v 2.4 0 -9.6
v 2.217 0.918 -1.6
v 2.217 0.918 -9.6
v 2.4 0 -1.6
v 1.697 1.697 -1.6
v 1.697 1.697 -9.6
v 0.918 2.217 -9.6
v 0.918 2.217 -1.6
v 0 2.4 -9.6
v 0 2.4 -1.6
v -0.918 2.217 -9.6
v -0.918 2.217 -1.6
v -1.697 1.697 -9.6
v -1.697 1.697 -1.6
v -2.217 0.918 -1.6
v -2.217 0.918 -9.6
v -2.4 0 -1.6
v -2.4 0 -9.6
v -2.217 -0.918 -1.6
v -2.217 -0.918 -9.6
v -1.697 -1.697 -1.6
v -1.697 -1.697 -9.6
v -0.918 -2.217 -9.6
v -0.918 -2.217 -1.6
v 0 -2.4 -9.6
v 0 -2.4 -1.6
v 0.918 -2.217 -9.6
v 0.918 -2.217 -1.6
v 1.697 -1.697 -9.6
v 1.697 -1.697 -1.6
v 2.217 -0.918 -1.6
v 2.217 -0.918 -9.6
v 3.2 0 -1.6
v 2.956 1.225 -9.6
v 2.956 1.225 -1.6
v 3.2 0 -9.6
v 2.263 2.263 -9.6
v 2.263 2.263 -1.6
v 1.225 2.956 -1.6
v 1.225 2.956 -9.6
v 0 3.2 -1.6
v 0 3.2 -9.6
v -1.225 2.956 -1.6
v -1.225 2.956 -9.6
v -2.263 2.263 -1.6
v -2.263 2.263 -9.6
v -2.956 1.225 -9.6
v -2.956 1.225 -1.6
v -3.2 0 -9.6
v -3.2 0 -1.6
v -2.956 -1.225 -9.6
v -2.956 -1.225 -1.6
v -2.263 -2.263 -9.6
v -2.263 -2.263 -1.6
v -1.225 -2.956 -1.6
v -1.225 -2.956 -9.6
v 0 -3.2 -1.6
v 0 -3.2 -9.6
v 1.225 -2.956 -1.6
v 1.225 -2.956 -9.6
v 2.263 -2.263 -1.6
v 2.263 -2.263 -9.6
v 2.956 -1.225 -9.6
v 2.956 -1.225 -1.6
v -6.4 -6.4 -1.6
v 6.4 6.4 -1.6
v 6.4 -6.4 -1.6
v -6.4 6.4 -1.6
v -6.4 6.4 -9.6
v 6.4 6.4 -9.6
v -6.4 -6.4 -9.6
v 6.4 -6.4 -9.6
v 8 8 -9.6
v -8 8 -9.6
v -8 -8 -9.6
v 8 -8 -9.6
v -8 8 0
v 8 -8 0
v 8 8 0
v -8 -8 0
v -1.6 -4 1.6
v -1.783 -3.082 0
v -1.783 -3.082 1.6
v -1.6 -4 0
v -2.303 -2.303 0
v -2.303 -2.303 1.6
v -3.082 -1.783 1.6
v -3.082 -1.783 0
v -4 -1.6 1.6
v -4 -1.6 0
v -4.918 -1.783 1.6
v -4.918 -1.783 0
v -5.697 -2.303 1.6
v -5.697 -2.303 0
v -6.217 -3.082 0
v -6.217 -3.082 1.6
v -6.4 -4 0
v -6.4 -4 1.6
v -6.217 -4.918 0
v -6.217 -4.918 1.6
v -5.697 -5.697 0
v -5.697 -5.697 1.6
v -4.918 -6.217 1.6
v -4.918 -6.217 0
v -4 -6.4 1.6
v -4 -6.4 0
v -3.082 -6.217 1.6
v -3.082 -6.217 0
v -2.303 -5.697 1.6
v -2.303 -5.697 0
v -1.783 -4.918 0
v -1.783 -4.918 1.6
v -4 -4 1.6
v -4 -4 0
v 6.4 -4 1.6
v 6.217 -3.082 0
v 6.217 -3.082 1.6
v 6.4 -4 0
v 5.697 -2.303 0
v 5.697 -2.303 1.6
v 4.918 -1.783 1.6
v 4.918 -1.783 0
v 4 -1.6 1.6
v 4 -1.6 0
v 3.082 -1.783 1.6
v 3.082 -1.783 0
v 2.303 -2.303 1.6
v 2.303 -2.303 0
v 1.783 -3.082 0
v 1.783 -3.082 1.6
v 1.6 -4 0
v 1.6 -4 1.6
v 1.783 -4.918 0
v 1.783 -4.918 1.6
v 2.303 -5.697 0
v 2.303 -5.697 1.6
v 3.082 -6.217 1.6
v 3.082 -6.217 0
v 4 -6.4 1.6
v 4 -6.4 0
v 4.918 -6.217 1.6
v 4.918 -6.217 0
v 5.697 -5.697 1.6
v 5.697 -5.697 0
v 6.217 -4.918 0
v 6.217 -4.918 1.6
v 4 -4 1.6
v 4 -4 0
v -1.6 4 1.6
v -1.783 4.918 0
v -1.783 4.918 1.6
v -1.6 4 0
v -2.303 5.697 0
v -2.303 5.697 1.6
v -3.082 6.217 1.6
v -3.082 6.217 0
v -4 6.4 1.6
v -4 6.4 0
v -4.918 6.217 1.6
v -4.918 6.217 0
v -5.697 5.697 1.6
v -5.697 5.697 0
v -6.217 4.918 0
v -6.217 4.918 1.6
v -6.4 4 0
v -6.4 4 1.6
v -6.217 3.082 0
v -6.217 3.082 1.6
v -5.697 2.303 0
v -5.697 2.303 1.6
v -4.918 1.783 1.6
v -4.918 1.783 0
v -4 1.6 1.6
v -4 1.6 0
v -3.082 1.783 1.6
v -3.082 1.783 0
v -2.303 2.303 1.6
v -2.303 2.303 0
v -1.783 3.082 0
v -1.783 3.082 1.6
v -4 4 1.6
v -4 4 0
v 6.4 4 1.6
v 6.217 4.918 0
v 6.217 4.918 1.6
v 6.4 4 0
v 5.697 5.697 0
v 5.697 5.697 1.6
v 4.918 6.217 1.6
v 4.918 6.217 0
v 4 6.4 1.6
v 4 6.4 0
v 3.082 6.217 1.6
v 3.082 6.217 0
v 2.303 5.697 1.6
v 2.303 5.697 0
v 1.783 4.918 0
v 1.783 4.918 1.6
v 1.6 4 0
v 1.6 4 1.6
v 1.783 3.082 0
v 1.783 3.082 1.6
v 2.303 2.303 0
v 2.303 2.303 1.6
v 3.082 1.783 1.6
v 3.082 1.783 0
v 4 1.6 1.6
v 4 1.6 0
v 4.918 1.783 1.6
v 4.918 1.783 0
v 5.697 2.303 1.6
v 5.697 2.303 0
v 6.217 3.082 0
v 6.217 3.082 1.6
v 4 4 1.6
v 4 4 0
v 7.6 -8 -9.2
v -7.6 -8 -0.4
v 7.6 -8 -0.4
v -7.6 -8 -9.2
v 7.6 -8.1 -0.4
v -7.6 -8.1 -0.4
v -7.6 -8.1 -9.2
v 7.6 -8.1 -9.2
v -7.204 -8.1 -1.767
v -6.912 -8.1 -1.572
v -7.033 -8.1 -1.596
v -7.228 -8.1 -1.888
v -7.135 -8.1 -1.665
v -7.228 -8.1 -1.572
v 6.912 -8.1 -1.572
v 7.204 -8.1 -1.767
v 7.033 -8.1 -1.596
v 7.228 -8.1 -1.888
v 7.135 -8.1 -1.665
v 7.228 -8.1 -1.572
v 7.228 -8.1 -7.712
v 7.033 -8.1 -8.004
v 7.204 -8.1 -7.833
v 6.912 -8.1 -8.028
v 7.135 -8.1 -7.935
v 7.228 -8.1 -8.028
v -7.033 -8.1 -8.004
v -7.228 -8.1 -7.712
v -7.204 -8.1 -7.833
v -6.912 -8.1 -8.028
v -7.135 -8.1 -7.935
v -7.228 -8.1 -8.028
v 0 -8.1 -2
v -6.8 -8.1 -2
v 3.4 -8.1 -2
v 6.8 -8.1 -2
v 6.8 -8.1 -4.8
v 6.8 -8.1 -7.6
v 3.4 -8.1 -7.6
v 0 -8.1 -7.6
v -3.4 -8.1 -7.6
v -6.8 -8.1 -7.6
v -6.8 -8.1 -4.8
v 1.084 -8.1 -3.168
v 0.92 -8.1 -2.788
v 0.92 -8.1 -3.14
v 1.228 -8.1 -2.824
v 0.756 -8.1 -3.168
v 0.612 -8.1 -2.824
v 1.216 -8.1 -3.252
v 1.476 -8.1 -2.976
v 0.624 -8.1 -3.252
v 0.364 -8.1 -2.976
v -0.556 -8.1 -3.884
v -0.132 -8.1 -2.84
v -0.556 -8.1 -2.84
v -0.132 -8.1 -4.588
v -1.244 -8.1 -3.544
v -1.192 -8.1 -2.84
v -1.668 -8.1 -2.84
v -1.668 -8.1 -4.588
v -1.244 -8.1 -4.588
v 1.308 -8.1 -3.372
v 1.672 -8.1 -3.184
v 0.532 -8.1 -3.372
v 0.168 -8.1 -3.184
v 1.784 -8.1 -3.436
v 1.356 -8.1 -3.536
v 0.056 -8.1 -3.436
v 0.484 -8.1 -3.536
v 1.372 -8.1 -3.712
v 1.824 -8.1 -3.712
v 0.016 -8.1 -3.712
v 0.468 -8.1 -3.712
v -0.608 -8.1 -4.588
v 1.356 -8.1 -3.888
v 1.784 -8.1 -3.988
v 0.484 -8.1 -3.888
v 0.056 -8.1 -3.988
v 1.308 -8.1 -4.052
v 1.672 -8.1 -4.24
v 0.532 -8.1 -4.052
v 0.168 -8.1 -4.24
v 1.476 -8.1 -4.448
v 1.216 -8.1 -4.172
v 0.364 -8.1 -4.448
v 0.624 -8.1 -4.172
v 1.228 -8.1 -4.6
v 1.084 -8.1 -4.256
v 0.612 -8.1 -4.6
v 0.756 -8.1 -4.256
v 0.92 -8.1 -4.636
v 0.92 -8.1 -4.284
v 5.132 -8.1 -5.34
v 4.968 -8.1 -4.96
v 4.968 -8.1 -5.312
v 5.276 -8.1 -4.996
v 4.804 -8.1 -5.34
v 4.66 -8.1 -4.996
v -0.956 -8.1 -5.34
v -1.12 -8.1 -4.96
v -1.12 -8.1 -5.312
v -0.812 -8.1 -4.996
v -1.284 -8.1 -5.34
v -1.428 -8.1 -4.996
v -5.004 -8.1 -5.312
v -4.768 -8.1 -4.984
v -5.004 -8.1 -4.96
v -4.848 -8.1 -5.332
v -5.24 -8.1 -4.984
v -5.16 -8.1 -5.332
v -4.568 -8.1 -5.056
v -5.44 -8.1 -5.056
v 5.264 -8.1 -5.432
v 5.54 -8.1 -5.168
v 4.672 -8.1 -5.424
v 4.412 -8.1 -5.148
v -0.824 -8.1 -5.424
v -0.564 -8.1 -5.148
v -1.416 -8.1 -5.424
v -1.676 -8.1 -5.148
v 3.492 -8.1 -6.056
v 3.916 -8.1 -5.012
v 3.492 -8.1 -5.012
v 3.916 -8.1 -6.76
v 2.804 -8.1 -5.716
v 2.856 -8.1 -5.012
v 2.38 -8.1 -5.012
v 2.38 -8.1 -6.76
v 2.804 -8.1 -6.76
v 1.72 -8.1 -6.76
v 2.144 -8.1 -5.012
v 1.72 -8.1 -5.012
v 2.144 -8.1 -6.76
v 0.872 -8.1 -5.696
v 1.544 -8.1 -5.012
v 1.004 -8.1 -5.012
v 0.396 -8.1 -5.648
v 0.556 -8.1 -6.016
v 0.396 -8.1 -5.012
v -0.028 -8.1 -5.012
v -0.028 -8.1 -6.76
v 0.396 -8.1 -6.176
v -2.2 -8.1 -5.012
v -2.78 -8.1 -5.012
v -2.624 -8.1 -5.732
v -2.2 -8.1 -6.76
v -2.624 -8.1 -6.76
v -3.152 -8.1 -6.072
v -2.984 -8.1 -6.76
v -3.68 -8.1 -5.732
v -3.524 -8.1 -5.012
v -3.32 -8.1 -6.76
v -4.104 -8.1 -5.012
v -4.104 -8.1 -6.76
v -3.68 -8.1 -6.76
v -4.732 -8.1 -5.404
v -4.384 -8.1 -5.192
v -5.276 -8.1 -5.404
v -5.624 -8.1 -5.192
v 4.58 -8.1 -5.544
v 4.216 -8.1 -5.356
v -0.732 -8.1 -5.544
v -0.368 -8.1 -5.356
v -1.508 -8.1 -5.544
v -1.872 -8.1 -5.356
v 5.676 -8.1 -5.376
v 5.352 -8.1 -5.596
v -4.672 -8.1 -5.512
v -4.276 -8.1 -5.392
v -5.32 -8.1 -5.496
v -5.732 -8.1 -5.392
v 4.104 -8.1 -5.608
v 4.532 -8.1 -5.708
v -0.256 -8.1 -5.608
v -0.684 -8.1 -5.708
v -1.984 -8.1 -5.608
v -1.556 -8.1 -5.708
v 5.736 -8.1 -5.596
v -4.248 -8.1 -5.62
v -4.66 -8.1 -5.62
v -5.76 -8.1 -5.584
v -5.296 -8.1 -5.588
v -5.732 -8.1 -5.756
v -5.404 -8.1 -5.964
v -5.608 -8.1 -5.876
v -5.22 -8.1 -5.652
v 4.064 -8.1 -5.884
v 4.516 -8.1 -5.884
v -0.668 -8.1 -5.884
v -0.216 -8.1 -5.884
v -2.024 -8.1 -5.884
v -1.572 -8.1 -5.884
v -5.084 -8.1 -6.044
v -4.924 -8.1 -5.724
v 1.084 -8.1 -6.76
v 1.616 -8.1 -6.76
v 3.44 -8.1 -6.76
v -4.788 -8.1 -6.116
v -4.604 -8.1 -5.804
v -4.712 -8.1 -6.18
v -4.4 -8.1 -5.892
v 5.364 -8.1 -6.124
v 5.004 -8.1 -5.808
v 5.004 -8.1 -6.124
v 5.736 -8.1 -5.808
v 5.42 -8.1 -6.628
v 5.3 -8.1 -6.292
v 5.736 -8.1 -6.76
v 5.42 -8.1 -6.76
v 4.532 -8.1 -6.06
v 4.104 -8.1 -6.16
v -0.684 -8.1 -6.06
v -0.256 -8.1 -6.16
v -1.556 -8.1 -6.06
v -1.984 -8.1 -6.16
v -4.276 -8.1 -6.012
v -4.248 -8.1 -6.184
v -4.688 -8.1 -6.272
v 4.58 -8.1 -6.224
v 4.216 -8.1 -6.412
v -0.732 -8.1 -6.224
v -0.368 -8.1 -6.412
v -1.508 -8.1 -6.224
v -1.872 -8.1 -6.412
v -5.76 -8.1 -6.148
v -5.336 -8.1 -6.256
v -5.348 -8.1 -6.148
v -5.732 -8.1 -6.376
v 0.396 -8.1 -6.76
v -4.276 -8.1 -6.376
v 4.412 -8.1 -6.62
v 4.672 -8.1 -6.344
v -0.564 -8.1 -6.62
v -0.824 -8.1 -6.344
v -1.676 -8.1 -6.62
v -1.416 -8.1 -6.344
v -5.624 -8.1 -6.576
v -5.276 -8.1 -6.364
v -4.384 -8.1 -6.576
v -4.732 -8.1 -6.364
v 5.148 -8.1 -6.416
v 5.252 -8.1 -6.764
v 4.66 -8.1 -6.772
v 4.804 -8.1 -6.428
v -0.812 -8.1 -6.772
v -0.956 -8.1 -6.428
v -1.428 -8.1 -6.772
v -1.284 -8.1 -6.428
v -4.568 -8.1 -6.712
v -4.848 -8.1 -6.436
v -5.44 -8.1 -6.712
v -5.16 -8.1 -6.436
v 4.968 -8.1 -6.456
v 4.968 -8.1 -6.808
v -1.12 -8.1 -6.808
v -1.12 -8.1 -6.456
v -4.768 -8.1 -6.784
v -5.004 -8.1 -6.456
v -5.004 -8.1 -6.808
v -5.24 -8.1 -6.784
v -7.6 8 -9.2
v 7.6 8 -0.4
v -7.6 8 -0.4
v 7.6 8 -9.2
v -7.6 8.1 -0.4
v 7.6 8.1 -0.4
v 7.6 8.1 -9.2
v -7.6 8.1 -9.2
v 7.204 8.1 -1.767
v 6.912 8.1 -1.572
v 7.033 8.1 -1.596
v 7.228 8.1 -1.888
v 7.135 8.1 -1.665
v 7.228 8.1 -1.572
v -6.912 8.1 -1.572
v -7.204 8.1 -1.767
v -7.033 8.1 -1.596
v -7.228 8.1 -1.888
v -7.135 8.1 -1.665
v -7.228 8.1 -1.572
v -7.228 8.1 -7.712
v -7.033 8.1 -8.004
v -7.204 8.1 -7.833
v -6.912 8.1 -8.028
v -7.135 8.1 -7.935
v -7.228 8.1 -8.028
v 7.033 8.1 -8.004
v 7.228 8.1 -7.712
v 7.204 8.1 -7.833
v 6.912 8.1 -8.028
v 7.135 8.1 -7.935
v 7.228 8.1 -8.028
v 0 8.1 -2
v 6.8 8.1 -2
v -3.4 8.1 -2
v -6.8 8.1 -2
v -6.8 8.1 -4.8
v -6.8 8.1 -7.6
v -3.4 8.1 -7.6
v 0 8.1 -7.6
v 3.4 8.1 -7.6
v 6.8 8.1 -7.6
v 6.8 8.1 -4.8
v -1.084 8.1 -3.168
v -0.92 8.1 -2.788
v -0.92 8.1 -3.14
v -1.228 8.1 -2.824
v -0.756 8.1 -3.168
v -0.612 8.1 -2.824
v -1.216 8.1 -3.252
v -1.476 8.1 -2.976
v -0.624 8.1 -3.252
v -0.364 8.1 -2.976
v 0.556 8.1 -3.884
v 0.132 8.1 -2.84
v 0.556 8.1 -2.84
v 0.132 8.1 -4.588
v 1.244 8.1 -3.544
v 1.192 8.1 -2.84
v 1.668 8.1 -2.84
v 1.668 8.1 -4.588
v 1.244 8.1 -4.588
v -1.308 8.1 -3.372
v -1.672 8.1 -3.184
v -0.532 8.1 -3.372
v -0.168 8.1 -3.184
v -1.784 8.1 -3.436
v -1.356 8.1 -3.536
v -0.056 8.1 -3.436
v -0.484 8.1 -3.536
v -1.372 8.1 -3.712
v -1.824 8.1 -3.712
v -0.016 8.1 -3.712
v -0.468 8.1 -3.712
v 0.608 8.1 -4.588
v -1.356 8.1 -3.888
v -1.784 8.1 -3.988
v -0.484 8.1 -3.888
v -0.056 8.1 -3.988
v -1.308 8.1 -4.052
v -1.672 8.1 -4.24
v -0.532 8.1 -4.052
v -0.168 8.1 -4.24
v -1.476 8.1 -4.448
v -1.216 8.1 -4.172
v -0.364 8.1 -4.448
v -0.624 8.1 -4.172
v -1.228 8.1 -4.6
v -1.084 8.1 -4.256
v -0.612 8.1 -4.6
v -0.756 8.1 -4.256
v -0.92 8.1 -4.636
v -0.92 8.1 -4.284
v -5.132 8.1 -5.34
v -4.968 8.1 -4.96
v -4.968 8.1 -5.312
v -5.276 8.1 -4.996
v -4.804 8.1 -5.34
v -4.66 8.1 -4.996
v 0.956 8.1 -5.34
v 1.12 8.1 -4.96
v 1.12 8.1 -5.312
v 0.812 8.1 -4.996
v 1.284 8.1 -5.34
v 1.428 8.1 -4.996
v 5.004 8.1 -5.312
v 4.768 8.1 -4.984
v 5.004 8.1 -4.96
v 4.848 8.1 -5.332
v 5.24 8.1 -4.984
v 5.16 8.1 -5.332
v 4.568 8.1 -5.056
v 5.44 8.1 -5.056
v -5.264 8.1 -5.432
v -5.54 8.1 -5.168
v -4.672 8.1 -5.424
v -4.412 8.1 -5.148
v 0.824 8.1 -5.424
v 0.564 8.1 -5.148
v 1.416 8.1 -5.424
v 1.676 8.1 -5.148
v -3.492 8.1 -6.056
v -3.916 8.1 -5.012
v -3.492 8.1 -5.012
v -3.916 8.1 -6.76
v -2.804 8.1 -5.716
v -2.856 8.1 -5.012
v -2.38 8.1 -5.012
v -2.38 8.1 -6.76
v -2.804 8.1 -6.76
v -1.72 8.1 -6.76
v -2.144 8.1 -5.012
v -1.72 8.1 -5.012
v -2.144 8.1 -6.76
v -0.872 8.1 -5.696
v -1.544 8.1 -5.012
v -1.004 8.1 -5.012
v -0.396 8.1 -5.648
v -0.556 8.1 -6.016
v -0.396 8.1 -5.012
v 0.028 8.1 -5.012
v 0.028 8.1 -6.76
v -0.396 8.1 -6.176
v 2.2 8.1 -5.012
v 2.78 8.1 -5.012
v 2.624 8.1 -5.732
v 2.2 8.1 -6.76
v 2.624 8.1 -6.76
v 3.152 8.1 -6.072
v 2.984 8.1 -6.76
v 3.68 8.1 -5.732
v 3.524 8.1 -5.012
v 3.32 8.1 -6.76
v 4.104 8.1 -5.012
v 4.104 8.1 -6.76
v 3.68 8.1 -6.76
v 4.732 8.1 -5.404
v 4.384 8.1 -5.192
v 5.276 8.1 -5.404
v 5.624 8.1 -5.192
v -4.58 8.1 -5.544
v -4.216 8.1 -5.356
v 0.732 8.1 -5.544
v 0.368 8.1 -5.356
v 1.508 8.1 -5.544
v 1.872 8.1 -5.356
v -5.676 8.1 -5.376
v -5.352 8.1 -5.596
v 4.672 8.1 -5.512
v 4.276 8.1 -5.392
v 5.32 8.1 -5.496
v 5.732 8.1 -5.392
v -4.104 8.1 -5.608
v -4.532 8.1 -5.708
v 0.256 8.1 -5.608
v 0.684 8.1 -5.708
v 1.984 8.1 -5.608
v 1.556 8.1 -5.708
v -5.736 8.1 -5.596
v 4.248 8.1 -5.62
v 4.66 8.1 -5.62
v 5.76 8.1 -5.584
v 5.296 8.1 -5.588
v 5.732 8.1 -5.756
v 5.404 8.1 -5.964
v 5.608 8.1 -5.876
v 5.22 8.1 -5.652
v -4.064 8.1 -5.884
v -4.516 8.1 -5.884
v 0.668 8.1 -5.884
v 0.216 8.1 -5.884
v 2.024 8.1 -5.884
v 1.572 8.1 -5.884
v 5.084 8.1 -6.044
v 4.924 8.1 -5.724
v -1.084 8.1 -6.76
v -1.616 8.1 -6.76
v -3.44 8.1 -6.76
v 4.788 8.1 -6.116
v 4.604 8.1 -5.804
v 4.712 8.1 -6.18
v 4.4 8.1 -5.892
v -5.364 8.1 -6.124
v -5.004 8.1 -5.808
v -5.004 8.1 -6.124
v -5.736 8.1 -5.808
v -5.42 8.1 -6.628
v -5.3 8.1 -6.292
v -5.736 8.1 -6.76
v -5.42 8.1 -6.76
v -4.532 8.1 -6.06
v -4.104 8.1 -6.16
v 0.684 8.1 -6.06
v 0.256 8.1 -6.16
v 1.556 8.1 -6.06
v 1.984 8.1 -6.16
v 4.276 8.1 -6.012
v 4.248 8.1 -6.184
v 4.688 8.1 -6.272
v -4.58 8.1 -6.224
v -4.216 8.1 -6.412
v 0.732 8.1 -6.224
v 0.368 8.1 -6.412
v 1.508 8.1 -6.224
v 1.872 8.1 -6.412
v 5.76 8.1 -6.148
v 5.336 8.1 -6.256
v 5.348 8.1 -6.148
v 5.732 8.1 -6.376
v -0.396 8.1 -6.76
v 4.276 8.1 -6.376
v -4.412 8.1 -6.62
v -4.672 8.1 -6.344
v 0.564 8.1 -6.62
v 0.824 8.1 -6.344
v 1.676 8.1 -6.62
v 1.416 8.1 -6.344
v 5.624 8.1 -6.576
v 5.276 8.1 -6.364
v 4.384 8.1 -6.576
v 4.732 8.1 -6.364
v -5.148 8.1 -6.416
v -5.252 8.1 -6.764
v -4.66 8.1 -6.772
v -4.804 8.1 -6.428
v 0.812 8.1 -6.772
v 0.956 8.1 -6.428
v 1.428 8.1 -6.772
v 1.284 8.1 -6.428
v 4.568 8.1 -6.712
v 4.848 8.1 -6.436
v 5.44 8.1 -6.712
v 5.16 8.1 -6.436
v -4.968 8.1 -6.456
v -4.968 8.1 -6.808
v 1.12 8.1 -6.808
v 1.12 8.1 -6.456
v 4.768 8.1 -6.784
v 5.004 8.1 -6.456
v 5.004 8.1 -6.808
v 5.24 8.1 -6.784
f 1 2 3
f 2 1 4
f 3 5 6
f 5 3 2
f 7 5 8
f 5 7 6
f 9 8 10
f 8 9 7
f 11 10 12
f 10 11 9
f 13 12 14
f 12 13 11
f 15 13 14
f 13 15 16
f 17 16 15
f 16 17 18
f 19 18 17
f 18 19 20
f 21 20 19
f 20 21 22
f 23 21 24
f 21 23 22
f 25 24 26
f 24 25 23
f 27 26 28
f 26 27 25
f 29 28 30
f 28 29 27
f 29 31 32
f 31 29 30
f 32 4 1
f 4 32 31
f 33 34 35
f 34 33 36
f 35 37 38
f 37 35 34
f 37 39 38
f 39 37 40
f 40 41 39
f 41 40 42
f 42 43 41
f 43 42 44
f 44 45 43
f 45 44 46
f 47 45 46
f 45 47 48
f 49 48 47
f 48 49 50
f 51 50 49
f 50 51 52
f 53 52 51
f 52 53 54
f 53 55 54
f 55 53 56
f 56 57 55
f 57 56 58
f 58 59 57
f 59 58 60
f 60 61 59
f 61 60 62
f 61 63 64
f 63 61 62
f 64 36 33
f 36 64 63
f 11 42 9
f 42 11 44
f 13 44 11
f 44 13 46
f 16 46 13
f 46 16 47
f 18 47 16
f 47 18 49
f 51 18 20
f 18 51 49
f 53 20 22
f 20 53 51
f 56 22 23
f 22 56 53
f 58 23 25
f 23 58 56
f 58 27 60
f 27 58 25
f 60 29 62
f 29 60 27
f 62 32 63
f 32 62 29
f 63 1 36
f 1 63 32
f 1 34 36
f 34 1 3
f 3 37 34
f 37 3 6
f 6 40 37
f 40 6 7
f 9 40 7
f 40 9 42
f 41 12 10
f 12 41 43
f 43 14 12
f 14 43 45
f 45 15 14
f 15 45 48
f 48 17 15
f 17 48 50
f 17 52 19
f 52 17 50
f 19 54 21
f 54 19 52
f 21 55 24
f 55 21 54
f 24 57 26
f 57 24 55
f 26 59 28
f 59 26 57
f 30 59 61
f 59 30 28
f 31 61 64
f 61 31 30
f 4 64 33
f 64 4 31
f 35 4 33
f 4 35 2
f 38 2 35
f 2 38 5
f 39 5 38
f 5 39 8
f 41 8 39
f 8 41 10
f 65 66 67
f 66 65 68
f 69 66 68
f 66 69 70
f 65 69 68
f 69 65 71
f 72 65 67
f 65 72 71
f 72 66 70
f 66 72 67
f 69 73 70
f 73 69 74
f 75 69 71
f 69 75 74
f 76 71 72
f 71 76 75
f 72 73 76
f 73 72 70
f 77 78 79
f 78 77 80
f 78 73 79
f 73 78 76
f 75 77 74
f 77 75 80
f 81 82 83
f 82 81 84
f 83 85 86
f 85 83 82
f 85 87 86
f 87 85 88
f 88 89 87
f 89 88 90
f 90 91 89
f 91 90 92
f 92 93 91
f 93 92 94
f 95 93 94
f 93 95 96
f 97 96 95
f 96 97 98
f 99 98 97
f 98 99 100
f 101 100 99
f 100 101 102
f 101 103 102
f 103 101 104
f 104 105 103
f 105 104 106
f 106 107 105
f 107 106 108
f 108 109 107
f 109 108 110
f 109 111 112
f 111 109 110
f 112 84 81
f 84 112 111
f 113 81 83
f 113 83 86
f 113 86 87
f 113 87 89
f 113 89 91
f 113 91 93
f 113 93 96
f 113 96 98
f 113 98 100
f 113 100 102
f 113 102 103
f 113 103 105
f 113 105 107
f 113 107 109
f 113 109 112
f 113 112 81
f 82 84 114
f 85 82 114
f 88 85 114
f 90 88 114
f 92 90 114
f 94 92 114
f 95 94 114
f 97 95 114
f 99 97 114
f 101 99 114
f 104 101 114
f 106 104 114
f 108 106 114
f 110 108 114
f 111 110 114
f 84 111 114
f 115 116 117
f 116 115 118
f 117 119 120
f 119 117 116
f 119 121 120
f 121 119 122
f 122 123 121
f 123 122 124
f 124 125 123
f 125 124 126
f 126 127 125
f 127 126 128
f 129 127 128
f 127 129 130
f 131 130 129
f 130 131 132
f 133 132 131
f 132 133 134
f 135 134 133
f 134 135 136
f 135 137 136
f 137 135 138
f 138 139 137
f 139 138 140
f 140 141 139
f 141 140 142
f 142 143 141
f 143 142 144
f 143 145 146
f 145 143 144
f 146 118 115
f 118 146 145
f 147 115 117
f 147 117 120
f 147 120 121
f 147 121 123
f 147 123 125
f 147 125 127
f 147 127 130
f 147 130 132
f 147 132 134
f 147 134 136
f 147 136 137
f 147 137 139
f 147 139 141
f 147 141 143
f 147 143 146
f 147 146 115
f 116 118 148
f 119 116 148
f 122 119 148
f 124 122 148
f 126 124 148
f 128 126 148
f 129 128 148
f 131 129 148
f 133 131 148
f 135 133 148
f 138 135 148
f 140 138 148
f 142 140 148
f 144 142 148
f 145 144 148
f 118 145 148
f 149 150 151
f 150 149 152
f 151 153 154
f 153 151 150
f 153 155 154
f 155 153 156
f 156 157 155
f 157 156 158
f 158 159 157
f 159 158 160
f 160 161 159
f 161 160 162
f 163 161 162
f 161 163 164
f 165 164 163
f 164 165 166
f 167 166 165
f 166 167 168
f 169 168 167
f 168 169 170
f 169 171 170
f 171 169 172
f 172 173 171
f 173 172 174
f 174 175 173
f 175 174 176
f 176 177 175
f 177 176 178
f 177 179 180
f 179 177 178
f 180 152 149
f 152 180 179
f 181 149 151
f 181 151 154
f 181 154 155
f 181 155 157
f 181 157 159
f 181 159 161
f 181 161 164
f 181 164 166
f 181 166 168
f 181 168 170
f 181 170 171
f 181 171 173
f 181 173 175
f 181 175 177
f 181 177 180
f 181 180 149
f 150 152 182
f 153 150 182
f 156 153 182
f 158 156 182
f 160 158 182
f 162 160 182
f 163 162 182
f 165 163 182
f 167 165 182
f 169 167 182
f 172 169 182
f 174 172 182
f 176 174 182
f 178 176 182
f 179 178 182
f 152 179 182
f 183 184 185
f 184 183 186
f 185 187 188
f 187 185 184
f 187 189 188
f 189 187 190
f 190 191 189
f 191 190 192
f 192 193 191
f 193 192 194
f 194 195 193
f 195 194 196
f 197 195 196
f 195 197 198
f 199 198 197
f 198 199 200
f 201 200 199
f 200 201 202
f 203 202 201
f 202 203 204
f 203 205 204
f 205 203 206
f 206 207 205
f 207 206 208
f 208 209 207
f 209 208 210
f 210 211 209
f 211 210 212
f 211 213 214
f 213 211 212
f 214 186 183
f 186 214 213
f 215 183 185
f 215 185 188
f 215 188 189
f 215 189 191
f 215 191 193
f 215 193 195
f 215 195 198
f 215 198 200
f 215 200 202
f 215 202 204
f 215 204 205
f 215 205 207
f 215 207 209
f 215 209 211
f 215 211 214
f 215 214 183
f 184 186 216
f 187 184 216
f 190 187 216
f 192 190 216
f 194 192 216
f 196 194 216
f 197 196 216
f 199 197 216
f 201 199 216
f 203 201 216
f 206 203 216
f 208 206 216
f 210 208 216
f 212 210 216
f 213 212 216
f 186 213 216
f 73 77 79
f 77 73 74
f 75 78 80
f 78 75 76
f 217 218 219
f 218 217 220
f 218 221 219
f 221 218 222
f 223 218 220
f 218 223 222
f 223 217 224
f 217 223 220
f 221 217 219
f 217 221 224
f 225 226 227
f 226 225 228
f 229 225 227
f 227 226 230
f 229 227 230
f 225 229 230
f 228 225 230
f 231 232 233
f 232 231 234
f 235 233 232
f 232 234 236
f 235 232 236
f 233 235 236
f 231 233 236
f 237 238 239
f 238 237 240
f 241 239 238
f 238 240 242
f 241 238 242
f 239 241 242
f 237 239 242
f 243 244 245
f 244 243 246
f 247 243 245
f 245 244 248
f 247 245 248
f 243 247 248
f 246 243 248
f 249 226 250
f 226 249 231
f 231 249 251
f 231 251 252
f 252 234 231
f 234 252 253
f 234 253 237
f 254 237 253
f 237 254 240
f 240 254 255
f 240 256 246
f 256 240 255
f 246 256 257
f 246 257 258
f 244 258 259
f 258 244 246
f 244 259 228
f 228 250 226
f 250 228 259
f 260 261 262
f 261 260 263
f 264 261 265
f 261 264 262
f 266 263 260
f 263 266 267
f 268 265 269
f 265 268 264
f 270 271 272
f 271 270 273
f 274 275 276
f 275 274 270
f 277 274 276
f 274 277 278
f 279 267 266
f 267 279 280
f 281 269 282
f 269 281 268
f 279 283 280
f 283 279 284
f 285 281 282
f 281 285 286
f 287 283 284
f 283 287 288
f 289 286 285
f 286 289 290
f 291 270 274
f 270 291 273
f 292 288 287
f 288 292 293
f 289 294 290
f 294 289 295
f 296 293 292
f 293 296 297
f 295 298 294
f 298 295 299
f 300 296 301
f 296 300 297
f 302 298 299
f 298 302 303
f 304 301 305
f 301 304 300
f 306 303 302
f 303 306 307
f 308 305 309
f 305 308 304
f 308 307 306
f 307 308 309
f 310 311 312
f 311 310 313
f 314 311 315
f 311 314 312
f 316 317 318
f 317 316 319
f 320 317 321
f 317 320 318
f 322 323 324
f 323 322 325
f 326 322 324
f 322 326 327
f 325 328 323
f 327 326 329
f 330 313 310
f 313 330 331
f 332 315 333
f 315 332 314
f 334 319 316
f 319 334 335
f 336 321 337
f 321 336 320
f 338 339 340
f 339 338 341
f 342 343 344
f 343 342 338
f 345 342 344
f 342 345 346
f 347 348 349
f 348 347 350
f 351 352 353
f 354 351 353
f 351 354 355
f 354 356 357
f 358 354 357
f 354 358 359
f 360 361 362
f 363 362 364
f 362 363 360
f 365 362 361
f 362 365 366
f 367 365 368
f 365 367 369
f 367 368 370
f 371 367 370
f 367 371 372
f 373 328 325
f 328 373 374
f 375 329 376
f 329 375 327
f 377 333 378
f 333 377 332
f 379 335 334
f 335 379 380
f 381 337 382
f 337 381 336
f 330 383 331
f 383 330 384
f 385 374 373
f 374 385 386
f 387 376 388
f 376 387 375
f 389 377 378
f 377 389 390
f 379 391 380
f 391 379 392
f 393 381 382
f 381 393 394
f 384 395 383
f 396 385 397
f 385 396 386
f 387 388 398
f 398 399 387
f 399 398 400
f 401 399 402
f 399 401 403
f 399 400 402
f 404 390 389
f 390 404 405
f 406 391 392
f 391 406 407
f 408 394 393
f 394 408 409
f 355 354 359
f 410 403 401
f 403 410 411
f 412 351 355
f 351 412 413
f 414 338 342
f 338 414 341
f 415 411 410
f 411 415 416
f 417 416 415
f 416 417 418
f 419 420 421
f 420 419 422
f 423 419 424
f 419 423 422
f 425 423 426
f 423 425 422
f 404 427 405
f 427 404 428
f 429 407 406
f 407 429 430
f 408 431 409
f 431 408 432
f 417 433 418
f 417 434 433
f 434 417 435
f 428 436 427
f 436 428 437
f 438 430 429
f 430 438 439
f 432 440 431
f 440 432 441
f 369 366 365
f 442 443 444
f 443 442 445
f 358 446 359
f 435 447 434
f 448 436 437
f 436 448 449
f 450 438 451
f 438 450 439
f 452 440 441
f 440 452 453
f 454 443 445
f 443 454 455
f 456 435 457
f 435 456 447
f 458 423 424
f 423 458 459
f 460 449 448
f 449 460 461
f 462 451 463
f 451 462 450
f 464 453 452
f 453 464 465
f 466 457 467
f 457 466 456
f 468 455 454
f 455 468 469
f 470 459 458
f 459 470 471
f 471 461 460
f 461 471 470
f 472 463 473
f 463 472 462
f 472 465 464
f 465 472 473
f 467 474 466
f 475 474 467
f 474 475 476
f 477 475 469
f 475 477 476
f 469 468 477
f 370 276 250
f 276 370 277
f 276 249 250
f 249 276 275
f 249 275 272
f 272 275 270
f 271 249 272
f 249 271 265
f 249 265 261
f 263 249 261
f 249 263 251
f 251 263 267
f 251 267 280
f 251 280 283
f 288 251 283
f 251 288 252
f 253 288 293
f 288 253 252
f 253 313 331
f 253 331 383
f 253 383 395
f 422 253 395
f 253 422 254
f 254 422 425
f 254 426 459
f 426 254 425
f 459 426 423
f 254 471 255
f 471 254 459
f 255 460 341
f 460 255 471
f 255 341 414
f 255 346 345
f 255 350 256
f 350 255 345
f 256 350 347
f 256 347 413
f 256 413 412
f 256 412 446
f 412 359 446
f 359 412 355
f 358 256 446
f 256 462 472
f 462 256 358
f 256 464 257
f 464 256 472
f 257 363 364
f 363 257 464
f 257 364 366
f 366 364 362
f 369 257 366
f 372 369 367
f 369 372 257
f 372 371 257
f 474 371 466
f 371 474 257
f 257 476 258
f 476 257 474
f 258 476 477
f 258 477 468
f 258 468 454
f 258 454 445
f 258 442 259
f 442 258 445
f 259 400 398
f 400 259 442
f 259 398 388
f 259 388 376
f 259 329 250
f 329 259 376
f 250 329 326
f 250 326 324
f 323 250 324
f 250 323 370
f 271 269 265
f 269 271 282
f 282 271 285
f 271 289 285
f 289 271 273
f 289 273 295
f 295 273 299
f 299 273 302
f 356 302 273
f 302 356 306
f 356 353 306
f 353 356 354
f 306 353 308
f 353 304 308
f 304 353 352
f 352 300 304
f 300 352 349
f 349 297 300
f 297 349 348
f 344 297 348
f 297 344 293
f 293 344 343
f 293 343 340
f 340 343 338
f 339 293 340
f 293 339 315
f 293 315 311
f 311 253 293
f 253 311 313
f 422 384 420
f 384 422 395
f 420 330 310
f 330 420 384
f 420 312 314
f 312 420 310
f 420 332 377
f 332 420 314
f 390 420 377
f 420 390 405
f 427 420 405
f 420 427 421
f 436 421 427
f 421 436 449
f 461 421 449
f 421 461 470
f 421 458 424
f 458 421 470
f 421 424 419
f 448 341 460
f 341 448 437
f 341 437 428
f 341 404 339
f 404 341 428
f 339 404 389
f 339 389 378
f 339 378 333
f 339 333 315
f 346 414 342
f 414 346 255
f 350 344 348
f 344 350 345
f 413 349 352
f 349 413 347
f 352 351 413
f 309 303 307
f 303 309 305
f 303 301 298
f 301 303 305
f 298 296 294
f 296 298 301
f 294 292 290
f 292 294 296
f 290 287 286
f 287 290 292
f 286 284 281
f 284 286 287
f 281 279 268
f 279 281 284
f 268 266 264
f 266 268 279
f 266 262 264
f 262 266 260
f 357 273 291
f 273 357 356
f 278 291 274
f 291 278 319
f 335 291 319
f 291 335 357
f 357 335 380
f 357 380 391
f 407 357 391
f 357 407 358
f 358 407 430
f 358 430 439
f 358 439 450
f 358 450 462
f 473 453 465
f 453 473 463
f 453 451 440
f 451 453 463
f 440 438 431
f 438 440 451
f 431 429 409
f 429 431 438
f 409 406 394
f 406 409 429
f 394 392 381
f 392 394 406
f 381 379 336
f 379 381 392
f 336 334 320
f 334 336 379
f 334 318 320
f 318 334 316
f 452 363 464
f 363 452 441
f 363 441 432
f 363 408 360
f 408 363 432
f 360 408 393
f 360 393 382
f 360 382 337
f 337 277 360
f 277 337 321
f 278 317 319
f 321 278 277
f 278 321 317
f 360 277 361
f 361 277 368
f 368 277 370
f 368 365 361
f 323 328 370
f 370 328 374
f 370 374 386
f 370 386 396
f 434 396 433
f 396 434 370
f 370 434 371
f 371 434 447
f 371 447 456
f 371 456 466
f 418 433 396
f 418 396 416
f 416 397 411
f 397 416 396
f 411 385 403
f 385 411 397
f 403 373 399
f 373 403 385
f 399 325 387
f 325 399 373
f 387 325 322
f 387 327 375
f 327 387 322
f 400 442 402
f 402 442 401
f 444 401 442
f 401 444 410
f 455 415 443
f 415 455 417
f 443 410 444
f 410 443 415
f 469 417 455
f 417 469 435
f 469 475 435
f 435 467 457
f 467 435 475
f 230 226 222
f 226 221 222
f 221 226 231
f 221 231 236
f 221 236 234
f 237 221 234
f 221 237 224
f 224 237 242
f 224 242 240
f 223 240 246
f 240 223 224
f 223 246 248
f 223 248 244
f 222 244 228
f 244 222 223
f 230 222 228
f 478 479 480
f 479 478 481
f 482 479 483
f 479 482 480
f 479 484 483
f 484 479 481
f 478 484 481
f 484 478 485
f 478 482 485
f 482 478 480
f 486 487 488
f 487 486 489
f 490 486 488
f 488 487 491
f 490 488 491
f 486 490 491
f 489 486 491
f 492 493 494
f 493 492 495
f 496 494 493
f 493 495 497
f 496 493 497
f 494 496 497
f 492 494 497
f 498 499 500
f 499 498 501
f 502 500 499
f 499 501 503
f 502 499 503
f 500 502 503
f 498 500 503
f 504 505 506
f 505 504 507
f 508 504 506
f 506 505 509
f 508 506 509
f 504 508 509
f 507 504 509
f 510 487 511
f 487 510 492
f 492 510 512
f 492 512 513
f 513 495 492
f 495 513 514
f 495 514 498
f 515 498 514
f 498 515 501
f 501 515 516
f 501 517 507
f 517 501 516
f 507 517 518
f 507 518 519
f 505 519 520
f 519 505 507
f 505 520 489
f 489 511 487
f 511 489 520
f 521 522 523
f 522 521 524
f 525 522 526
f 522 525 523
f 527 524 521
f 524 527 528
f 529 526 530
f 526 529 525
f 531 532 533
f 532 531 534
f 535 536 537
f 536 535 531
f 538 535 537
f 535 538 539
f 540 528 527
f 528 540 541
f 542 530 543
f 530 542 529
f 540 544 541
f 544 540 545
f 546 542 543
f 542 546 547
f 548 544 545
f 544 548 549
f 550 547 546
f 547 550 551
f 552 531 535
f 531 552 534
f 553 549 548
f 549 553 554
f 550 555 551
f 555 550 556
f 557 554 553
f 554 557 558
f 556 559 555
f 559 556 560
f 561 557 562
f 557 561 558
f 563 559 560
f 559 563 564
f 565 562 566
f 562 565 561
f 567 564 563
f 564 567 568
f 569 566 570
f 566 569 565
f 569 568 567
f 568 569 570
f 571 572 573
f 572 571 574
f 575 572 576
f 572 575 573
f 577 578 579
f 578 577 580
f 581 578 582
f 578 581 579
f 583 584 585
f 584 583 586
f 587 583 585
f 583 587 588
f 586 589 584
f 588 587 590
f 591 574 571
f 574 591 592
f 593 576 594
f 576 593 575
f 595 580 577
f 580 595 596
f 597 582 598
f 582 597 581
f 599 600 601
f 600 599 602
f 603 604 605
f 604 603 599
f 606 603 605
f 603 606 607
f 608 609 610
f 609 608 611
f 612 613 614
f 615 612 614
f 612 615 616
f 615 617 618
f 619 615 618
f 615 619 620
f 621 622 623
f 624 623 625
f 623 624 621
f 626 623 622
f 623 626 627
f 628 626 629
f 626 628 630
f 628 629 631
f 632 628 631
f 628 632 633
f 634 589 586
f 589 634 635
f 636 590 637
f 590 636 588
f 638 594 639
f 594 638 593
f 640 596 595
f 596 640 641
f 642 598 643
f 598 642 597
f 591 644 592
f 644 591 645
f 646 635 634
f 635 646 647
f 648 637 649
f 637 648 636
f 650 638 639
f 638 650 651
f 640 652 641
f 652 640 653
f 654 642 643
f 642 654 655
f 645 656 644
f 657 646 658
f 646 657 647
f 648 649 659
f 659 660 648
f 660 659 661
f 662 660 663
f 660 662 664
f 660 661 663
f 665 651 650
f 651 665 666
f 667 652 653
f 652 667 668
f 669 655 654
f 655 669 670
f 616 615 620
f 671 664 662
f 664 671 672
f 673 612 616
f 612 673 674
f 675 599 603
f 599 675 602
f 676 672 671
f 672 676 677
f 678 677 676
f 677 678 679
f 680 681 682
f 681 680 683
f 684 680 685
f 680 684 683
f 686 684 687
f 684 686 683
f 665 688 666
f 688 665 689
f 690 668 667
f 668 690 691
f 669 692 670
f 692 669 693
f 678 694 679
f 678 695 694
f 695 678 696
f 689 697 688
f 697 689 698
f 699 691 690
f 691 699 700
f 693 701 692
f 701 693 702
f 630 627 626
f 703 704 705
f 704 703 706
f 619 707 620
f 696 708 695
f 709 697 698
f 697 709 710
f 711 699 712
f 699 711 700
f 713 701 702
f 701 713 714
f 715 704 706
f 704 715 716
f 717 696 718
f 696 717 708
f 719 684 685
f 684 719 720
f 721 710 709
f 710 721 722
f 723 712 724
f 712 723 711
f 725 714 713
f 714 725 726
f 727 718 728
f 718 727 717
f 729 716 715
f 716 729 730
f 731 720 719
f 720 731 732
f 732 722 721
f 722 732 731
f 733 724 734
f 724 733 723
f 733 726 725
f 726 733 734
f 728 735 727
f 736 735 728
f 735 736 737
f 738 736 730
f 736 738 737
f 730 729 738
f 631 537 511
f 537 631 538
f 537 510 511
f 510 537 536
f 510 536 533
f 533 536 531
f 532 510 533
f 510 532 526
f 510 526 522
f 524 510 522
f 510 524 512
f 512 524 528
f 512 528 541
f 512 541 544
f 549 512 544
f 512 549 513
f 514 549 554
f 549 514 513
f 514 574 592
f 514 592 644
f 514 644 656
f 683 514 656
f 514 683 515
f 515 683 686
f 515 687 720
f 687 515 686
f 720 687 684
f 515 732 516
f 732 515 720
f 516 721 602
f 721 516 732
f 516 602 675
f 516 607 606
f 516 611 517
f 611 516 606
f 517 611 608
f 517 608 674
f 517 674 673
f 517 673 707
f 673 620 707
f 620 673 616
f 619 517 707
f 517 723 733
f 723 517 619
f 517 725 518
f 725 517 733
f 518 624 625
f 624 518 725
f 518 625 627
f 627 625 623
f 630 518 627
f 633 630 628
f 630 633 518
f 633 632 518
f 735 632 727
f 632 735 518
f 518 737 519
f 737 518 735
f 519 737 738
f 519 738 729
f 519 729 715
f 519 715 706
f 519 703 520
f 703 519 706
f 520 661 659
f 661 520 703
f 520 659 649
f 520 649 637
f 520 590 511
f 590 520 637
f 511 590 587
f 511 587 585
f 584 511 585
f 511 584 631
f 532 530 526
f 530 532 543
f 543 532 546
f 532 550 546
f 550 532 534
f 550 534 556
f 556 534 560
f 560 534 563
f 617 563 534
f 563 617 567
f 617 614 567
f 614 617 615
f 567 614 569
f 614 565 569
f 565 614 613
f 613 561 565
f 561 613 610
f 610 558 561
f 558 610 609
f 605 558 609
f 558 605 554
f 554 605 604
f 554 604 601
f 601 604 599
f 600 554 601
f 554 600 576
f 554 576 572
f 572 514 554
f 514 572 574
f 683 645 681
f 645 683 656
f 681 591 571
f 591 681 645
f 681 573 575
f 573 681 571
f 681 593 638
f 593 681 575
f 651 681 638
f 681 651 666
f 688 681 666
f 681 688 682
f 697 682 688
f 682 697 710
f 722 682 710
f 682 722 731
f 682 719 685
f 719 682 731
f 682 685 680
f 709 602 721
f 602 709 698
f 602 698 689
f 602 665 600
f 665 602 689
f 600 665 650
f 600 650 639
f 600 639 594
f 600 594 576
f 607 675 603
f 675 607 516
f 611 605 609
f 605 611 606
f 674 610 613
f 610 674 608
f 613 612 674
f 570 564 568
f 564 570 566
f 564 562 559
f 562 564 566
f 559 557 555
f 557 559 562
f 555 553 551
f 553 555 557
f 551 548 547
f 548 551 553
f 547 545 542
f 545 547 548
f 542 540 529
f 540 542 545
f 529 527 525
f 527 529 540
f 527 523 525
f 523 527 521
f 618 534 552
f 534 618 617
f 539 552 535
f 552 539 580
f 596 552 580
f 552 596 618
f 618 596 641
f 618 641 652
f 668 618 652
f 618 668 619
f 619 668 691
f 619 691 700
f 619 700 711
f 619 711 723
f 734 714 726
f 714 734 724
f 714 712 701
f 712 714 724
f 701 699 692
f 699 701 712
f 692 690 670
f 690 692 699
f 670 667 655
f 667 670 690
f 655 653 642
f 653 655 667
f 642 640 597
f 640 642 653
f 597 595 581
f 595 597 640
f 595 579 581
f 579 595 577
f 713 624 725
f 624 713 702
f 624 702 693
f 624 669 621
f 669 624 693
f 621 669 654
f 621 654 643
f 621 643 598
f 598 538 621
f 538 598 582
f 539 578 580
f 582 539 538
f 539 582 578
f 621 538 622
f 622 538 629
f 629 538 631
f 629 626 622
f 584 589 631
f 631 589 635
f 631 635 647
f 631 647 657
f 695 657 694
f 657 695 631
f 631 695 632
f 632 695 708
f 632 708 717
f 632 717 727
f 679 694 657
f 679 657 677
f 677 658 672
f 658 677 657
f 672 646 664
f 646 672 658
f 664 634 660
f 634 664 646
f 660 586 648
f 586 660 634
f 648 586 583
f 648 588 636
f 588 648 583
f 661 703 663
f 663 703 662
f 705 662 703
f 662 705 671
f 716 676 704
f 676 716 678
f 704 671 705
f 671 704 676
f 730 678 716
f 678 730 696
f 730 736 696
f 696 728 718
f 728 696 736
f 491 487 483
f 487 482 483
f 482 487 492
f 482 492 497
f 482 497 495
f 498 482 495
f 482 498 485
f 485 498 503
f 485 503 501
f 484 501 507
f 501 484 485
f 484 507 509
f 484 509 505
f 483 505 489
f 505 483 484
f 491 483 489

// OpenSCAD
use <../lib.scad>
use <192375h.scad>
use <3003.scad>
function ldraw_lib__3003d01() = [
// 0 Brick  2 x  2 with "NO SMOKING" Sticker on Both Sides
// 0 Name: 3003d01.dat
// 0 Author: Takeshi Takahashi [RainbowDolphin]
// 0 !LDRAW_ORG Shortcut UPDATE 2024-08
// 0 !LICENSE Licensed under CC BY 4.0 : see CAreadme.txt
// 
// 0 BFC CERTIFY CCW
  [0,"BFC","CERTIFY"],
  [0,"BFC","CCW"],
// 
// 0 !CATEGORY Sticker Shortcut
// 0 !KEYWORDS Bricklink 3003pb019, Gas Station, Set 6375-2
// 
// 0 !HISTORY 2024-09-30 [OrionP] Official Update 2024-08
// 
// 1 16 0 0 0 1 0 0 0 1 0 0 0 1 3003.dat
  [1,16,0,0,0,1,0,0,0,1,0,0,0,1, ldraw_lib__3003()],
// 1 16 0 12 -20 1 0 0 0 0 -1 0 1 0 192375h.dat
  [1,16,0,12,-20,1,0,0,0,0,-1,0,1,0, ldraw_lib__192375h()],
// 1 16 0 12 20 -1 0 0 0 0 -1 0 -1 0 192375h.dat
  [1,16,0,12,20,-1,0,0,0,0,-1,0,-1,0, ldraw_lib__192375h()],
];
module ldraw_lib__3003d01(step=0, col=false, unit=2/5, alt=false, line=0.2, solid=!$preview)
    makepoly(ldraw_lib__3003d01(), step=step, col=col, unit=unit, alt=alt, line=line, solid=solid);
ldraw_lib__3003d01(line=0.2);
